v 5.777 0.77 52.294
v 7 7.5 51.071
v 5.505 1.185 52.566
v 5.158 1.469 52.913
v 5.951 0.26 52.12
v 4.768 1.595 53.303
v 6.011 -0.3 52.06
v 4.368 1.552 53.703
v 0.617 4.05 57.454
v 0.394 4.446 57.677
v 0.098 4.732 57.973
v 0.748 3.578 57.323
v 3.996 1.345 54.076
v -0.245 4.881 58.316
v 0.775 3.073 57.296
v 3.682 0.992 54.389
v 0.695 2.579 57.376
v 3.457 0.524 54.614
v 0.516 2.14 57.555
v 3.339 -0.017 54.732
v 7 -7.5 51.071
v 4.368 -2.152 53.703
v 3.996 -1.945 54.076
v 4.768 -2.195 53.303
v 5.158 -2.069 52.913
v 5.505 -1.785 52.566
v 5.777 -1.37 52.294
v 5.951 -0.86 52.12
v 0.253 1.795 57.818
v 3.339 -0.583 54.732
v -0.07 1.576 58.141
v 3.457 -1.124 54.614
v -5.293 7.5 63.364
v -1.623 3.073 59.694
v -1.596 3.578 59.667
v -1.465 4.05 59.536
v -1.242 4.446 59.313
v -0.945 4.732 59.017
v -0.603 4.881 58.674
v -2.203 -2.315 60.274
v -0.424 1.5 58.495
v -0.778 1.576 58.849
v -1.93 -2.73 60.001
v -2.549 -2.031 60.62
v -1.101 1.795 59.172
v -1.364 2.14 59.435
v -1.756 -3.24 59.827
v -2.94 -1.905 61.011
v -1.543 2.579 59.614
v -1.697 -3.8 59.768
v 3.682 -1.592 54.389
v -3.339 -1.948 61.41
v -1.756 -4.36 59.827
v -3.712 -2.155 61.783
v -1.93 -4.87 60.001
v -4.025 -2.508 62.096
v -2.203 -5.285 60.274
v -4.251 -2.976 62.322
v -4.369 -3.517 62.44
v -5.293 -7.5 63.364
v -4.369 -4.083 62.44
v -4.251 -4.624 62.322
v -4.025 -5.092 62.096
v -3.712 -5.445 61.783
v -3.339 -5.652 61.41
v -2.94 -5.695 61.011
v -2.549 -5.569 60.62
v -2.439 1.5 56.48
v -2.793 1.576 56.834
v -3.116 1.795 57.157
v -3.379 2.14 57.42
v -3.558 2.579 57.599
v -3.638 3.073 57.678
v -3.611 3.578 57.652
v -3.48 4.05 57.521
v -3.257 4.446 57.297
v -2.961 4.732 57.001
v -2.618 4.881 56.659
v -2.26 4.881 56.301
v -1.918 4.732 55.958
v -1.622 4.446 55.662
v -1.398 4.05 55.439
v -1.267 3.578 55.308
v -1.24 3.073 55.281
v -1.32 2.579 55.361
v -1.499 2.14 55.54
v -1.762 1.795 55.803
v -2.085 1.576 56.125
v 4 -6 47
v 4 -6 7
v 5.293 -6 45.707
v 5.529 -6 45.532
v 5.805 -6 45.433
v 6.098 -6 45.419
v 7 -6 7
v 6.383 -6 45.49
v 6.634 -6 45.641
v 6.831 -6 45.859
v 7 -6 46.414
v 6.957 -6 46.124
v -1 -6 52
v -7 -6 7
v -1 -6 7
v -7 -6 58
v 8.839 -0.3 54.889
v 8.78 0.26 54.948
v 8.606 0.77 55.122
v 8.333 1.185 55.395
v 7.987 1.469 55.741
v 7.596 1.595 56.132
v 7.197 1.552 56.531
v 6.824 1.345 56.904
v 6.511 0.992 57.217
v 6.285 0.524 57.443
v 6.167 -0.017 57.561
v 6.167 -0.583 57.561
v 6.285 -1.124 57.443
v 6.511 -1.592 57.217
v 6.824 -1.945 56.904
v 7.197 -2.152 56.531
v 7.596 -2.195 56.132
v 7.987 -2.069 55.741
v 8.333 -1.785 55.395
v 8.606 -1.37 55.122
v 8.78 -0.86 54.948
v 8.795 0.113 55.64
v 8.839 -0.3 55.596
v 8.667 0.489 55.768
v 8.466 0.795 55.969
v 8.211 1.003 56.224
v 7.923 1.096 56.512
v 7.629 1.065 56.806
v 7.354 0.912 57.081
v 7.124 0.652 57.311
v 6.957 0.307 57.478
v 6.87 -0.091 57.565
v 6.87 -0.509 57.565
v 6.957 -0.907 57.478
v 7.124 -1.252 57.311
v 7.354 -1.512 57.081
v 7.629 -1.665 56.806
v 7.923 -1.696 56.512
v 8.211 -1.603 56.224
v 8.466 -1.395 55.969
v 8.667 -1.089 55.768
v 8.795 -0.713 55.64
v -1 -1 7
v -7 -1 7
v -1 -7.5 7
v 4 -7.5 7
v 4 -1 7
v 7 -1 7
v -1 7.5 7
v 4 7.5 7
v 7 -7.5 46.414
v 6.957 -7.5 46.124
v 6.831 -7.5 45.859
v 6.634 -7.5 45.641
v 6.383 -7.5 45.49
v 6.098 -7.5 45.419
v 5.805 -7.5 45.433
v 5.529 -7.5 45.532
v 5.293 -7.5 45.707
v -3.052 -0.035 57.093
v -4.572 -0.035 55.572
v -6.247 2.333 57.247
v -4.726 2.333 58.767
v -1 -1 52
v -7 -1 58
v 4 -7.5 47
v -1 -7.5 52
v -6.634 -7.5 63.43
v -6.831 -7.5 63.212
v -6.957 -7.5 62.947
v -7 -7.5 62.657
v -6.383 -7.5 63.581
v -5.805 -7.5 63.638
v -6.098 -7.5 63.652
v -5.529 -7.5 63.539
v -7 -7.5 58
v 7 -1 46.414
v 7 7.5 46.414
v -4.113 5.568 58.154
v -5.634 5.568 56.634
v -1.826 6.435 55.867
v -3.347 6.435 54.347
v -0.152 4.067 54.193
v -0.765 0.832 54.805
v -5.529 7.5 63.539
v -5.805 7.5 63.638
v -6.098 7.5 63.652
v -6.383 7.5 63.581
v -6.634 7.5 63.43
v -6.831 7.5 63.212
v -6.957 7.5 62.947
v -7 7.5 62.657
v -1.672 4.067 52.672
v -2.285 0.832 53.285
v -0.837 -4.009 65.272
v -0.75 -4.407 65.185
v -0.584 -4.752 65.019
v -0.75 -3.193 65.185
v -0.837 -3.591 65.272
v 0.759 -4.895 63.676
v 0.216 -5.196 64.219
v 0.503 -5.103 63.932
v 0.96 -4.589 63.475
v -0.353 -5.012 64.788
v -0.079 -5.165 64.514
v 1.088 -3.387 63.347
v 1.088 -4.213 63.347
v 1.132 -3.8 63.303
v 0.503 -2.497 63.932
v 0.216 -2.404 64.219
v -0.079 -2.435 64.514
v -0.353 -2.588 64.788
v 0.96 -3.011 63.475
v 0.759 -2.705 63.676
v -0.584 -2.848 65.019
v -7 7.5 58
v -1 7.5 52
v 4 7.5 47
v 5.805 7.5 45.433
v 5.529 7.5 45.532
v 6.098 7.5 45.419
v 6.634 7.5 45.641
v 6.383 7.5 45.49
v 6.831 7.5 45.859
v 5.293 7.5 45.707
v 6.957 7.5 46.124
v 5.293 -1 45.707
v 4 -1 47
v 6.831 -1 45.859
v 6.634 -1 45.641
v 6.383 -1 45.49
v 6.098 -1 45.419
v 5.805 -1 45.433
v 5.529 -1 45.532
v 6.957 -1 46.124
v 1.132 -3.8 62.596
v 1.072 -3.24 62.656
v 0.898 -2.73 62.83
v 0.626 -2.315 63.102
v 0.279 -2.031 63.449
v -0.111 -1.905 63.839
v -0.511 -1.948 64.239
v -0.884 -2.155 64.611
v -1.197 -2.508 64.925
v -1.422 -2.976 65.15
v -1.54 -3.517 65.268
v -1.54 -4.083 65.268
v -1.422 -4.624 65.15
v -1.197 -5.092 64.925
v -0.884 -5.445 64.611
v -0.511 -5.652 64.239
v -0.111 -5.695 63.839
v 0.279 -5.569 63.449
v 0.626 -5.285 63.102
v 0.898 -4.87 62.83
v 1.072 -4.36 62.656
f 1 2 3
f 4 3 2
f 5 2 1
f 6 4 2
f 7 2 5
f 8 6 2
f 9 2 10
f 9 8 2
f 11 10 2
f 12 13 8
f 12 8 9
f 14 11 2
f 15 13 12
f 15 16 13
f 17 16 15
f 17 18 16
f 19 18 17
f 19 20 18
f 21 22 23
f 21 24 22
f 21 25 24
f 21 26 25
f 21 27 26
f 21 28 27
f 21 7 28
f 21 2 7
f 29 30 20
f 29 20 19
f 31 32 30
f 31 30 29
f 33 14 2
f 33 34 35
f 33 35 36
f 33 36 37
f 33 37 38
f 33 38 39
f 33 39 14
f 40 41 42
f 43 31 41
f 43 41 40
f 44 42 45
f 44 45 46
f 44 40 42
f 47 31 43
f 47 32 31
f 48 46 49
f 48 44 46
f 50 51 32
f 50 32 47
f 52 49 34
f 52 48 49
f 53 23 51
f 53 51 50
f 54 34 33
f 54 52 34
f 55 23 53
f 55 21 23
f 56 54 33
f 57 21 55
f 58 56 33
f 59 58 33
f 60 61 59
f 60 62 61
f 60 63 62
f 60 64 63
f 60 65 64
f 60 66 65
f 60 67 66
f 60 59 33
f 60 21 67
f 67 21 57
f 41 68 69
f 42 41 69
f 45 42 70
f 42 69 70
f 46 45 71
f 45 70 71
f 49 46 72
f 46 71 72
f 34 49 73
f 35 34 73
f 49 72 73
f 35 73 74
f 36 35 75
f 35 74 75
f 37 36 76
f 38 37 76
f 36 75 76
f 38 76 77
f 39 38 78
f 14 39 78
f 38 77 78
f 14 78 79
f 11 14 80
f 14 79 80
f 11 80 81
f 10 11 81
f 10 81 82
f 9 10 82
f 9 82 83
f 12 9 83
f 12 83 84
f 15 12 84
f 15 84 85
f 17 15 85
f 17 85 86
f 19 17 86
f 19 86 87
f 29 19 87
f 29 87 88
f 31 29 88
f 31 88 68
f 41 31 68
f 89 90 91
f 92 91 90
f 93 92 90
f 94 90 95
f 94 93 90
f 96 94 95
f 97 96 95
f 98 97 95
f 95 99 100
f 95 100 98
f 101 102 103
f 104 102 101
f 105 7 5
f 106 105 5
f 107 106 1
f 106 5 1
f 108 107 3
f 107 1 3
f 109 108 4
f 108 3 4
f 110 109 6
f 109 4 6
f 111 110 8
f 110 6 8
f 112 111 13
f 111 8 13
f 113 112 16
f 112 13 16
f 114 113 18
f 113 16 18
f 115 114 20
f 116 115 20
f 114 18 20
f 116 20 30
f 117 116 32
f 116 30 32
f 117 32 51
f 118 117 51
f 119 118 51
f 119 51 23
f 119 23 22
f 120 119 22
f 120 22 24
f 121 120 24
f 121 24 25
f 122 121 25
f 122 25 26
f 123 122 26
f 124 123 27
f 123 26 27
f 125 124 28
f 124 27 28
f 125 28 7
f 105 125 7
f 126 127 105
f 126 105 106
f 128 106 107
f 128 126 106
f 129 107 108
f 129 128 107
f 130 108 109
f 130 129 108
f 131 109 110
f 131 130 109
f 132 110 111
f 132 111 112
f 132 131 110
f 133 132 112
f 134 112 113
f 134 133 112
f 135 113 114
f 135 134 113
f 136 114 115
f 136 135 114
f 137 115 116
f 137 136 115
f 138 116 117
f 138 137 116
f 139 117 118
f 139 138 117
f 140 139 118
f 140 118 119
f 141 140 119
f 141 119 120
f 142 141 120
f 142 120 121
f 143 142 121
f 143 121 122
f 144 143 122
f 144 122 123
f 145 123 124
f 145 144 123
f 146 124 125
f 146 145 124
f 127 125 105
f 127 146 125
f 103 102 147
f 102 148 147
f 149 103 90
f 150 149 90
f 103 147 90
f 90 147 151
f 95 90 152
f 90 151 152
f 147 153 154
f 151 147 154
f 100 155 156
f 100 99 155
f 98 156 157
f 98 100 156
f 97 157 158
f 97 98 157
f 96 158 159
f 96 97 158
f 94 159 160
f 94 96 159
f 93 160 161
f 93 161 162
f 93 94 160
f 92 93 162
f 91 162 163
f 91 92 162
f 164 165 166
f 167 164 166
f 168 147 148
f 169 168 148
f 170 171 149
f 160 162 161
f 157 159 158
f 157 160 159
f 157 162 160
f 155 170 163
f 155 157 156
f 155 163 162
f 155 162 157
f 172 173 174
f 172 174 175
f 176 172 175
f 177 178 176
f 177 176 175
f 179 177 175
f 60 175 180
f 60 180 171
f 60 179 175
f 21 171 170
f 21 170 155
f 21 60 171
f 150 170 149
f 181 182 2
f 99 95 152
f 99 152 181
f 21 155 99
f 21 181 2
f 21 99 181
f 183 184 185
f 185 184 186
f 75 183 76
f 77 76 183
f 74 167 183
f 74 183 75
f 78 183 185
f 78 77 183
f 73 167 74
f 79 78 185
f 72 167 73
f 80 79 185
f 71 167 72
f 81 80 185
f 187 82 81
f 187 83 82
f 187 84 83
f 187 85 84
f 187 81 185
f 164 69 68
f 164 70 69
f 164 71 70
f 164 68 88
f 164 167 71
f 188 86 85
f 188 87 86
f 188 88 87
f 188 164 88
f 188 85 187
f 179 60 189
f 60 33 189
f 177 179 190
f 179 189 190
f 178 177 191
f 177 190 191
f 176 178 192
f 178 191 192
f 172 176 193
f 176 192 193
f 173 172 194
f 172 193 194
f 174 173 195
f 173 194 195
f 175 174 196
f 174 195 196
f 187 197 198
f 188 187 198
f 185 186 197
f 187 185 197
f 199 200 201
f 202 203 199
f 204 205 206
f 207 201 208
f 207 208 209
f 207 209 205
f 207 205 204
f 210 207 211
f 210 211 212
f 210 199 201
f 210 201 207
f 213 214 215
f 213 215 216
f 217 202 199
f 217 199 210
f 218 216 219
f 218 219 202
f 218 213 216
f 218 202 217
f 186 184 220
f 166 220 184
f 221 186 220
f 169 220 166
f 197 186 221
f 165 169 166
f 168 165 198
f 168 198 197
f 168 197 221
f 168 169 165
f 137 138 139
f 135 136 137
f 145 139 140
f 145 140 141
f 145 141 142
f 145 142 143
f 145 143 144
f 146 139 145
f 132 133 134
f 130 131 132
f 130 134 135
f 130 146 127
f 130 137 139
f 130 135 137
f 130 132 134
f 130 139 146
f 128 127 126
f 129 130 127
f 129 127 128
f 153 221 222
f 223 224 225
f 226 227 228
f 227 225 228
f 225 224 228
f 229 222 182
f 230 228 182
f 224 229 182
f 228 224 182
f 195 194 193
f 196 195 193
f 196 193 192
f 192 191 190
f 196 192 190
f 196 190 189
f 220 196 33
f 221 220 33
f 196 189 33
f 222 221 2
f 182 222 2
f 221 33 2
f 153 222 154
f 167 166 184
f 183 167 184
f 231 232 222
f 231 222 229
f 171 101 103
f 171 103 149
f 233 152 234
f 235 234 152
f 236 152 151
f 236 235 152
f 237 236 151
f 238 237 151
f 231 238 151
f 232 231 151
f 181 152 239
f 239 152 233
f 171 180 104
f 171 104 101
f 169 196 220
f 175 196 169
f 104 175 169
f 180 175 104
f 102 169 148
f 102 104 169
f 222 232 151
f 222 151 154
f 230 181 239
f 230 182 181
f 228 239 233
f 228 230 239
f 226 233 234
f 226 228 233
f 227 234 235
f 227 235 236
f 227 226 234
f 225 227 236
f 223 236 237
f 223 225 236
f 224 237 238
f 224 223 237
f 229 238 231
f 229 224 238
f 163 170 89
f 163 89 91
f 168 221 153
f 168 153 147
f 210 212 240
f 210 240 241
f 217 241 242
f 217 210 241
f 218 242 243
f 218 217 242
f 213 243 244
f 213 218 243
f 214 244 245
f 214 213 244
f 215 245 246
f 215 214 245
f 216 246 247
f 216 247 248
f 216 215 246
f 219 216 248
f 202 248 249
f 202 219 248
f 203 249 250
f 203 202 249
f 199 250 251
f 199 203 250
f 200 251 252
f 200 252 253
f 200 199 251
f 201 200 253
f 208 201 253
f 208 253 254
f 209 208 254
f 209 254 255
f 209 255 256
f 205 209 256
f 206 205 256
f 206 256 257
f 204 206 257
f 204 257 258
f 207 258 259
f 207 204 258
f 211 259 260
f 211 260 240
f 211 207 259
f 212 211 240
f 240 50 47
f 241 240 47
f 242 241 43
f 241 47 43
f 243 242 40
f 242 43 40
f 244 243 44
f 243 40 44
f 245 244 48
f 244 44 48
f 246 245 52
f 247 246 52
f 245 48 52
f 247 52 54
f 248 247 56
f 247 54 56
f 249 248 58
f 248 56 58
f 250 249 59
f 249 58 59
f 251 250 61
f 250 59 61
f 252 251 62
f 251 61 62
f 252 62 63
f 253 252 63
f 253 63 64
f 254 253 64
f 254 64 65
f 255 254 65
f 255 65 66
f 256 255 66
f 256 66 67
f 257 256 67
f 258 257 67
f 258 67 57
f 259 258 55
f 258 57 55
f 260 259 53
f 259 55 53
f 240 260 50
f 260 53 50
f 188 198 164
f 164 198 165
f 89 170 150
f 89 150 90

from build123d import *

# Parameters (mm, degrees)
PAD001_DEPTH         = 25
PAD001_DEPTH_BACK    = 26
POCKET004_DEPTH      = 7.501
POCKET004_DEPTH_BACK = 7.501
PAD002_DEPTH         = 15
POCKET005_DEPTH      = 2.15
SKETCH011_R          = 1.7
HOLE001_DEPTH        = 12.7504949366
SKETCH012_R          = 1.9
PAD003_DEPTH         = 4.5
CHAMFER_SIZE         = 0.5
FILLET001_R          = 1


with BuildPart() as part:
    # Sketch007 → Pad001 (new body, two sides)
    with BuildSketch(Plane.XY) as pad001_sk:
        Polygon((-7, -6), (-1, -6), (-1, -7.5), (4, -7.5), (4, -6), (7, -6), (7, -1), (4, -1), (4, 7.5), (-1, 7.5), (-1, -1), (-7, -1), align=None)
    extrude(amount=PAD001_DEPTH)
    extrude(pad001_sk.sketch, amount=-PAD001_DEPTH_BACK)

    # Sketch008 → Pocket004 (cut, two sides)
    with BuildSketch(Plane.XZ) as pocket004_sk:
        Polygon((-7, 25), (7, 11), (7, 25), align=None)
    extrude(amount=-POCKET004_DEPTH, mode=Mode.SUBTRACT)
    extrude(pocket004_sk.sketch, amount=POCKET004_DEPTH_BACK, mode=Mode.SUBTRACT)

    # Sketch009 (on Face8 of Pocket004) → Pad002 (join)
    with BuildSketch(Plane.XZ.offset(7.5)):
        Polygon((-7, 25), (7, 11), (7, 18.0710678119), (-7, 32.0710678119), align=None)
    extrude(amount=-PAD002_DEPTH)

    # Sketch010 (on Face12 of Pad002) → Pocket005 (cut)
    with BuildSketch(Plane(origin=(9, 0, 9), x_dir=(0.7071067812, 0, -0.7071067812), z_dir=(-0.7071067812, 0, -0.7071067812))):
        Polygon((-21.5619467058, -2.3333103769), (-20.6952570827, -5.5678400847), (-17.4607273749, -6.4345297078), (-15.0928872902, -4.0666896231), (-15.9595769133, -0.8321599153), (-19.1941066211, 0.0345297078), align=None)
    extrude(amount=-POCKET005_DEPTH, mode=Mode.SUBTRACT)

    # Sketch011 (on Face29 of Pocket005) → Hole001 (cut, through all)
    with BuildSketch(Plane(origin=(10.5202795796, 0, 10.5202795796), x_dir=(0, -1, 0), z_dir=(-0.7071067812, 0, -0.7071067812))):
        with Locations((-3.2, 18.327416998)):
            Circle(SKETCH011_R)
    extrude(amount=-HOLE001_DEPTH, mode=Mode.SUBTRACT)

    # Sketch012 (on Face9 of Hole001) → Pad003 (join)
    with BuildSketch(Plane(origin=(12.5355339059, 0, 12.5355339059), x_dir=(0.7071067812, 0, -0.7071067812), z_dir=(0.7071067812, 0, 0.7071067812))):
        with Locations((-22.027416998, -3.8)):
            Circle(SKETCH012_R)
        with Locations((-11.127416998, -0.3)):
            Circle(SKETCH012_R)
    extrude(amount=PAD003_DEPTH)

    # Chamfer
    chamfer_edges = [part.edges().sort_by_distance(p)[0] for p in [
        (-1.201724, -3.8, 32.636753),
        (6.50574, -0.3, 24.929289),
    ]]
    chamfer(chamfer_edges, length=CHAMFER_SIZE)

    # Fillet001
    fillet001_edges = [part.edges().sort_by_distance(p)[0] for p in [
        (-7, 0, 32.071068),
        (7, 3.25, 11),
        (7, -6.75, 11),
    ]]
    fillet(fillet001_edges, radius=FILLET001_R)


with BuildPart() as part_1:
    # Body001 placement: moved
    add(part.part.moved(Location((0, 0, 33))))


solid = part_1.part
